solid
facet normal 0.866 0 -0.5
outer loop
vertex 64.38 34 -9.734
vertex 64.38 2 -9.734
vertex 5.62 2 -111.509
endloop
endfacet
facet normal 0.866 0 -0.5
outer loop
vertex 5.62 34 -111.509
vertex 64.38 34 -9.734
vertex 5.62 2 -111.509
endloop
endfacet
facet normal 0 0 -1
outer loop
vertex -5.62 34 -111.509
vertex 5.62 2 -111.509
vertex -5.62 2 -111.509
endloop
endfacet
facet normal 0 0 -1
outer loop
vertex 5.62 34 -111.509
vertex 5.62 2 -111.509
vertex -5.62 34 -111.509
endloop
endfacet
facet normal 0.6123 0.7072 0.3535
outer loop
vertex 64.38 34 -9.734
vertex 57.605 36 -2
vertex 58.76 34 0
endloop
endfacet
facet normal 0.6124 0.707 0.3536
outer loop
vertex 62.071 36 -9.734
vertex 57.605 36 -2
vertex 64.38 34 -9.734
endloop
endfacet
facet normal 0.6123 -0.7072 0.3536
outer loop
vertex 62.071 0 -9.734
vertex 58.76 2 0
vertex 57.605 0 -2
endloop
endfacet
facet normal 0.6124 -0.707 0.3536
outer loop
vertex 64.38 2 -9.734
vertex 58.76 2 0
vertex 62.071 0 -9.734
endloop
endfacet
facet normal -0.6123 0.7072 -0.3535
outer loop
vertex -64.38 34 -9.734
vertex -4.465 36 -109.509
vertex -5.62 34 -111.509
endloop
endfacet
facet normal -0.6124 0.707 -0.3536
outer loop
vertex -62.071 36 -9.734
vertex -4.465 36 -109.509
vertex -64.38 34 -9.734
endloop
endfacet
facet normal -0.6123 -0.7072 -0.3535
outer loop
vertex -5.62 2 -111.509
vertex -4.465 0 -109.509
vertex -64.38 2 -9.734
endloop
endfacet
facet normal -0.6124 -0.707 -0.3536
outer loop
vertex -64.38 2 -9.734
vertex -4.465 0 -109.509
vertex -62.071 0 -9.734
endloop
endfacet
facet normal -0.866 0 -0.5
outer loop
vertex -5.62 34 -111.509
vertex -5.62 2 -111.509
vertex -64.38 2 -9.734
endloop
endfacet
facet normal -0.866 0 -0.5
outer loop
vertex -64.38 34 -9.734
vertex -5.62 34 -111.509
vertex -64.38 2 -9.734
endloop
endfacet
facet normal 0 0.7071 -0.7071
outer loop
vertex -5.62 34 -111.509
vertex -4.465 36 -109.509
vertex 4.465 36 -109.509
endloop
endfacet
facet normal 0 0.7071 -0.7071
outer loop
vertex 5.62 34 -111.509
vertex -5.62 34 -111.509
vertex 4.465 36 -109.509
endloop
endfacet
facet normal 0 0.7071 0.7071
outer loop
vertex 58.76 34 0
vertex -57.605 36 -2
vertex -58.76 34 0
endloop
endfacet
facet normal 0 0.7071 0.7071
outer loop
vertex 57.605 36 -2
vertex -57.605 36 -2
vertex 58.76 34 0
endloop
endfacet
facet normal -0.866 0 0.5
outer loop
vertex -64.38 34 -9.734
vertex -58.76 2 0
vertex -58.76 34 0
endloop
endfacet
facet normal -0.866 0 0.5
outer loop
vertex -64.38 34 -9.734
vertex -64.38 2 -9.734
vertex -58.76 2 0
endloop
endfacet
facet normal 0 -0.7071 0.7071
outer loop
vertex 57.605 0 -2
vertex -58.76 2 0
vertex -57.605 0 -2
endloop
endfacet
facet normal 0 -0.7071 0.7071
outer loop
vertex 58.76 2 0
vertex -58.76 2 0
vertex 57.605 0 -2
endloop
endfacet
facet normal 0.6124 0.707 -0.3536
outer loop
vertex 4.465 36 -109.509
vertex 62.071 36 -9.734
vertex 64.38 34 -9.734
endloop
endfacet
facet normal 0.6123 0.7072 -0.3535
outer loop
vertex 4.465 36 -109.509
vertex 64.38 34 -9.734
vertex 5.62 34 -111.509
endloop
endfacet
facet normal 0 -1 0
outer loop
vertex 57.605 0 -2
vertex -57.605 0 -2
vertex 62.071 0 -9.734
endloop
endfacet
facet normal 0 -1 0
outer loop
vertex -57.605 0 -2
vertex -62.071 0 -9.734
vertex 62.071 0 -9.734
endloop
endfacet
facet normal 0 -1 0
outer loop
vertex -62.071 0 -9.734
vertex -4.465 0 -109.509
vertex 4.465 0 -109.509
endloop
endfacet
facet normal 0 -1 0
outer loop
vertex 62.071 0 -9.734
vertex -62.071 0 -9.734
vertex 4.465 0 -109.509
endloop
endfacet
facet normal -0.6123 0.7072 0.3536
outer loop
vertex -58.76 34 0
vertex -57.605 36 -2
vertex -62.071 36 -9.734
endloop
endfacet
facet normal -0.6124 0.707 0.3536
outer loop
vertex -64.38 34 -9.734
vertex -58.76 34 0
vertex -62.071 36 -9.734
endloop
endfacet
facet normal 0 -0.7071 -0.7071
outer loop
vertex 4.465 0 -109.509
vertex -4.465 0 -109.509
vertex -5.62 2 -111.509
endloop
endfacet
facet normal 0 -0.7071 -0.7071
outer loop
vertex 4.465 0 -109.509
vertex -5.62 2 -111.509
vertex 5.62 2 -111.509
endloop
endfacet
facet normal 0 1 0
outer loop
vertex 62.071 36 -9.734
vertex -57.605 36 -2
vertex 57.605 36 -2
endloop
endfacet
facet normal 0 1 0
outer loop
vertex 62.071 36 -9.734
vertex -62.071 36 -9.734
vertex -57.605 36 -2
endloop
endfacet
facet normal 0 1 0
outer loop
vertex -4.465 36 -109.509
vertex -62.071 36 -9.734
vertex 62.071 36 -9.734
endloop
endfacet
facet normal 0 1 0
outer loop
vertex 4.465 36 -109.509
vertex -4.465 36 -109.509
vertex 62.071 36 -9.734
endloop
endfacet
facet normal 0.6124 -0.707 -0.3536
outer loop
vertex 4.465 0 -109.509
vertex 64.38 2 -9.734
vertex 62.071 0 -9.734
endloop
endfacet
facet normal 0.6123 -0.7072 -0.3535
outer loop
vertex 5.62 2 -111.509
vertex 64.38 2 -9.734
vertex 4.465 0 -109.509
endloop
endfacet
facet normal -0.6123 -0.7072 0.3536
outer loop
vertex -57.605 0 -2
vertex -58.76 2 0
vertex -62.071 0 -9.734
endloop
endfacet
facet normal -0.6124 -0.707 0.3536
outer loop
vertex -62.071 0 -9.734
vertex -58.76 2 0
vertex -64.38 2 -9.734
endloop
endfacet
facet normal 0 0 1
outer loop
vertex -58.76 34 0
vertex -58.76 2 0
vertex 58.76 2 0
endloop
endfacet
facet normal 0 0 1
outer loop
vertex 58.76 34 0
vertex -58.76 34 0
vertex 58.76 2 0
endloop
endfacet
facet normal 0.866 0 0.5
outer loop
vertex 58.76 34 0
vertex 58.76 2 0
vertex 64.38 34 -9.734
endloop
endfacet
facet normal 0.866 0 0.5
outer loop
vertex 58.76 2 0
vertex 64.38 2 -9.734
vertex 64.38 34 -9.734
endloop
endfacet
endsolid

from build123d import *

# Parameters (mm, degrees)
BOSS_EXTRU_1_DEPTH     = 36
CHANFREIN1_SIZE        = 11.24
CHANFREIN1_EDGE_2_SIZE = 11.24
CHANFREIN1_EDGE_3_SIZE = 11.24
CHANFREIN2_SIZE        = 2
CHANFREIN3_SIZE        = 2


with BuildPart() as part:
    # Esquisse1 → Boss.-Extru.1 (new body)
    with BuildSketch(Plane(origin=(0, 0, 0), x_dir=(1, 0, 0), z_dir=(0, 1, 0))):
        Polygon((-70, 0), (70, 0), (0, 121.24355653), align=None)
    extrude(amount=BOSS_EXTRU_1_DEPTH)

    # Chanfrein1
    chanfrein1_edges = [part.edges().sort_by_distance(p)[0] for p in [
        (70, 18, 0),
    ]]
    chamfer(chanfrein1_edges, length=CHANFREIN1_SIZE)

    # Chanfrein1 edge 2
    chanfrein1_edge_2_edges = [part.edges().sort_by_distance(p)[0] for p in [
        (-70, 18, 0),
    ]]
    chamfer(chanfrein1_edge_2_edges, length=CHANFREIN1_EDGE_2_SIZE)

    # Chanfrein1 edge 3
    chanfrein1_edge_3_edges = [part.edges().sort_by_distance(p)[0] for p in [
        (0, 18, -121.24355653),
    ]]
    chamfer(chanfrein1_edge_3_edges, length=CHANFREIN1_EDGE_3_SIZE)

    # Chanfrein2
    chanfrein2_edges = [part.edges().sort_by_distance(p)[0] for p in [
        (0, 36, 0),
        (-35, 36, -60.621778265),
        (35, 36, -60.621778265),
        (61.57, 36, -4.867062769),
        (0, 36, -111.509430991),
        (-61.57, 36, -4.867062769),
    ]]
    chamfer(chanfrein2_edges, length=CHANFREIN2_SIZE)

    # Chanfrein3
    chanfrein3_edges = [part.edges().sort_by_distance(p)[0] for p in [
        (0, 0, 0),
        (35, 0, -60.621778265),
        (-35, 0, -60.621778265),
        (61.57, 0, -4.867062769),
        (0, 0, -111.509430991),
        (-61.57, 0, -4.867062769),
    ]]
    chamfer(chanfrein3_edges, length=CHANFREIN3_SIZE)


solid = part.part
